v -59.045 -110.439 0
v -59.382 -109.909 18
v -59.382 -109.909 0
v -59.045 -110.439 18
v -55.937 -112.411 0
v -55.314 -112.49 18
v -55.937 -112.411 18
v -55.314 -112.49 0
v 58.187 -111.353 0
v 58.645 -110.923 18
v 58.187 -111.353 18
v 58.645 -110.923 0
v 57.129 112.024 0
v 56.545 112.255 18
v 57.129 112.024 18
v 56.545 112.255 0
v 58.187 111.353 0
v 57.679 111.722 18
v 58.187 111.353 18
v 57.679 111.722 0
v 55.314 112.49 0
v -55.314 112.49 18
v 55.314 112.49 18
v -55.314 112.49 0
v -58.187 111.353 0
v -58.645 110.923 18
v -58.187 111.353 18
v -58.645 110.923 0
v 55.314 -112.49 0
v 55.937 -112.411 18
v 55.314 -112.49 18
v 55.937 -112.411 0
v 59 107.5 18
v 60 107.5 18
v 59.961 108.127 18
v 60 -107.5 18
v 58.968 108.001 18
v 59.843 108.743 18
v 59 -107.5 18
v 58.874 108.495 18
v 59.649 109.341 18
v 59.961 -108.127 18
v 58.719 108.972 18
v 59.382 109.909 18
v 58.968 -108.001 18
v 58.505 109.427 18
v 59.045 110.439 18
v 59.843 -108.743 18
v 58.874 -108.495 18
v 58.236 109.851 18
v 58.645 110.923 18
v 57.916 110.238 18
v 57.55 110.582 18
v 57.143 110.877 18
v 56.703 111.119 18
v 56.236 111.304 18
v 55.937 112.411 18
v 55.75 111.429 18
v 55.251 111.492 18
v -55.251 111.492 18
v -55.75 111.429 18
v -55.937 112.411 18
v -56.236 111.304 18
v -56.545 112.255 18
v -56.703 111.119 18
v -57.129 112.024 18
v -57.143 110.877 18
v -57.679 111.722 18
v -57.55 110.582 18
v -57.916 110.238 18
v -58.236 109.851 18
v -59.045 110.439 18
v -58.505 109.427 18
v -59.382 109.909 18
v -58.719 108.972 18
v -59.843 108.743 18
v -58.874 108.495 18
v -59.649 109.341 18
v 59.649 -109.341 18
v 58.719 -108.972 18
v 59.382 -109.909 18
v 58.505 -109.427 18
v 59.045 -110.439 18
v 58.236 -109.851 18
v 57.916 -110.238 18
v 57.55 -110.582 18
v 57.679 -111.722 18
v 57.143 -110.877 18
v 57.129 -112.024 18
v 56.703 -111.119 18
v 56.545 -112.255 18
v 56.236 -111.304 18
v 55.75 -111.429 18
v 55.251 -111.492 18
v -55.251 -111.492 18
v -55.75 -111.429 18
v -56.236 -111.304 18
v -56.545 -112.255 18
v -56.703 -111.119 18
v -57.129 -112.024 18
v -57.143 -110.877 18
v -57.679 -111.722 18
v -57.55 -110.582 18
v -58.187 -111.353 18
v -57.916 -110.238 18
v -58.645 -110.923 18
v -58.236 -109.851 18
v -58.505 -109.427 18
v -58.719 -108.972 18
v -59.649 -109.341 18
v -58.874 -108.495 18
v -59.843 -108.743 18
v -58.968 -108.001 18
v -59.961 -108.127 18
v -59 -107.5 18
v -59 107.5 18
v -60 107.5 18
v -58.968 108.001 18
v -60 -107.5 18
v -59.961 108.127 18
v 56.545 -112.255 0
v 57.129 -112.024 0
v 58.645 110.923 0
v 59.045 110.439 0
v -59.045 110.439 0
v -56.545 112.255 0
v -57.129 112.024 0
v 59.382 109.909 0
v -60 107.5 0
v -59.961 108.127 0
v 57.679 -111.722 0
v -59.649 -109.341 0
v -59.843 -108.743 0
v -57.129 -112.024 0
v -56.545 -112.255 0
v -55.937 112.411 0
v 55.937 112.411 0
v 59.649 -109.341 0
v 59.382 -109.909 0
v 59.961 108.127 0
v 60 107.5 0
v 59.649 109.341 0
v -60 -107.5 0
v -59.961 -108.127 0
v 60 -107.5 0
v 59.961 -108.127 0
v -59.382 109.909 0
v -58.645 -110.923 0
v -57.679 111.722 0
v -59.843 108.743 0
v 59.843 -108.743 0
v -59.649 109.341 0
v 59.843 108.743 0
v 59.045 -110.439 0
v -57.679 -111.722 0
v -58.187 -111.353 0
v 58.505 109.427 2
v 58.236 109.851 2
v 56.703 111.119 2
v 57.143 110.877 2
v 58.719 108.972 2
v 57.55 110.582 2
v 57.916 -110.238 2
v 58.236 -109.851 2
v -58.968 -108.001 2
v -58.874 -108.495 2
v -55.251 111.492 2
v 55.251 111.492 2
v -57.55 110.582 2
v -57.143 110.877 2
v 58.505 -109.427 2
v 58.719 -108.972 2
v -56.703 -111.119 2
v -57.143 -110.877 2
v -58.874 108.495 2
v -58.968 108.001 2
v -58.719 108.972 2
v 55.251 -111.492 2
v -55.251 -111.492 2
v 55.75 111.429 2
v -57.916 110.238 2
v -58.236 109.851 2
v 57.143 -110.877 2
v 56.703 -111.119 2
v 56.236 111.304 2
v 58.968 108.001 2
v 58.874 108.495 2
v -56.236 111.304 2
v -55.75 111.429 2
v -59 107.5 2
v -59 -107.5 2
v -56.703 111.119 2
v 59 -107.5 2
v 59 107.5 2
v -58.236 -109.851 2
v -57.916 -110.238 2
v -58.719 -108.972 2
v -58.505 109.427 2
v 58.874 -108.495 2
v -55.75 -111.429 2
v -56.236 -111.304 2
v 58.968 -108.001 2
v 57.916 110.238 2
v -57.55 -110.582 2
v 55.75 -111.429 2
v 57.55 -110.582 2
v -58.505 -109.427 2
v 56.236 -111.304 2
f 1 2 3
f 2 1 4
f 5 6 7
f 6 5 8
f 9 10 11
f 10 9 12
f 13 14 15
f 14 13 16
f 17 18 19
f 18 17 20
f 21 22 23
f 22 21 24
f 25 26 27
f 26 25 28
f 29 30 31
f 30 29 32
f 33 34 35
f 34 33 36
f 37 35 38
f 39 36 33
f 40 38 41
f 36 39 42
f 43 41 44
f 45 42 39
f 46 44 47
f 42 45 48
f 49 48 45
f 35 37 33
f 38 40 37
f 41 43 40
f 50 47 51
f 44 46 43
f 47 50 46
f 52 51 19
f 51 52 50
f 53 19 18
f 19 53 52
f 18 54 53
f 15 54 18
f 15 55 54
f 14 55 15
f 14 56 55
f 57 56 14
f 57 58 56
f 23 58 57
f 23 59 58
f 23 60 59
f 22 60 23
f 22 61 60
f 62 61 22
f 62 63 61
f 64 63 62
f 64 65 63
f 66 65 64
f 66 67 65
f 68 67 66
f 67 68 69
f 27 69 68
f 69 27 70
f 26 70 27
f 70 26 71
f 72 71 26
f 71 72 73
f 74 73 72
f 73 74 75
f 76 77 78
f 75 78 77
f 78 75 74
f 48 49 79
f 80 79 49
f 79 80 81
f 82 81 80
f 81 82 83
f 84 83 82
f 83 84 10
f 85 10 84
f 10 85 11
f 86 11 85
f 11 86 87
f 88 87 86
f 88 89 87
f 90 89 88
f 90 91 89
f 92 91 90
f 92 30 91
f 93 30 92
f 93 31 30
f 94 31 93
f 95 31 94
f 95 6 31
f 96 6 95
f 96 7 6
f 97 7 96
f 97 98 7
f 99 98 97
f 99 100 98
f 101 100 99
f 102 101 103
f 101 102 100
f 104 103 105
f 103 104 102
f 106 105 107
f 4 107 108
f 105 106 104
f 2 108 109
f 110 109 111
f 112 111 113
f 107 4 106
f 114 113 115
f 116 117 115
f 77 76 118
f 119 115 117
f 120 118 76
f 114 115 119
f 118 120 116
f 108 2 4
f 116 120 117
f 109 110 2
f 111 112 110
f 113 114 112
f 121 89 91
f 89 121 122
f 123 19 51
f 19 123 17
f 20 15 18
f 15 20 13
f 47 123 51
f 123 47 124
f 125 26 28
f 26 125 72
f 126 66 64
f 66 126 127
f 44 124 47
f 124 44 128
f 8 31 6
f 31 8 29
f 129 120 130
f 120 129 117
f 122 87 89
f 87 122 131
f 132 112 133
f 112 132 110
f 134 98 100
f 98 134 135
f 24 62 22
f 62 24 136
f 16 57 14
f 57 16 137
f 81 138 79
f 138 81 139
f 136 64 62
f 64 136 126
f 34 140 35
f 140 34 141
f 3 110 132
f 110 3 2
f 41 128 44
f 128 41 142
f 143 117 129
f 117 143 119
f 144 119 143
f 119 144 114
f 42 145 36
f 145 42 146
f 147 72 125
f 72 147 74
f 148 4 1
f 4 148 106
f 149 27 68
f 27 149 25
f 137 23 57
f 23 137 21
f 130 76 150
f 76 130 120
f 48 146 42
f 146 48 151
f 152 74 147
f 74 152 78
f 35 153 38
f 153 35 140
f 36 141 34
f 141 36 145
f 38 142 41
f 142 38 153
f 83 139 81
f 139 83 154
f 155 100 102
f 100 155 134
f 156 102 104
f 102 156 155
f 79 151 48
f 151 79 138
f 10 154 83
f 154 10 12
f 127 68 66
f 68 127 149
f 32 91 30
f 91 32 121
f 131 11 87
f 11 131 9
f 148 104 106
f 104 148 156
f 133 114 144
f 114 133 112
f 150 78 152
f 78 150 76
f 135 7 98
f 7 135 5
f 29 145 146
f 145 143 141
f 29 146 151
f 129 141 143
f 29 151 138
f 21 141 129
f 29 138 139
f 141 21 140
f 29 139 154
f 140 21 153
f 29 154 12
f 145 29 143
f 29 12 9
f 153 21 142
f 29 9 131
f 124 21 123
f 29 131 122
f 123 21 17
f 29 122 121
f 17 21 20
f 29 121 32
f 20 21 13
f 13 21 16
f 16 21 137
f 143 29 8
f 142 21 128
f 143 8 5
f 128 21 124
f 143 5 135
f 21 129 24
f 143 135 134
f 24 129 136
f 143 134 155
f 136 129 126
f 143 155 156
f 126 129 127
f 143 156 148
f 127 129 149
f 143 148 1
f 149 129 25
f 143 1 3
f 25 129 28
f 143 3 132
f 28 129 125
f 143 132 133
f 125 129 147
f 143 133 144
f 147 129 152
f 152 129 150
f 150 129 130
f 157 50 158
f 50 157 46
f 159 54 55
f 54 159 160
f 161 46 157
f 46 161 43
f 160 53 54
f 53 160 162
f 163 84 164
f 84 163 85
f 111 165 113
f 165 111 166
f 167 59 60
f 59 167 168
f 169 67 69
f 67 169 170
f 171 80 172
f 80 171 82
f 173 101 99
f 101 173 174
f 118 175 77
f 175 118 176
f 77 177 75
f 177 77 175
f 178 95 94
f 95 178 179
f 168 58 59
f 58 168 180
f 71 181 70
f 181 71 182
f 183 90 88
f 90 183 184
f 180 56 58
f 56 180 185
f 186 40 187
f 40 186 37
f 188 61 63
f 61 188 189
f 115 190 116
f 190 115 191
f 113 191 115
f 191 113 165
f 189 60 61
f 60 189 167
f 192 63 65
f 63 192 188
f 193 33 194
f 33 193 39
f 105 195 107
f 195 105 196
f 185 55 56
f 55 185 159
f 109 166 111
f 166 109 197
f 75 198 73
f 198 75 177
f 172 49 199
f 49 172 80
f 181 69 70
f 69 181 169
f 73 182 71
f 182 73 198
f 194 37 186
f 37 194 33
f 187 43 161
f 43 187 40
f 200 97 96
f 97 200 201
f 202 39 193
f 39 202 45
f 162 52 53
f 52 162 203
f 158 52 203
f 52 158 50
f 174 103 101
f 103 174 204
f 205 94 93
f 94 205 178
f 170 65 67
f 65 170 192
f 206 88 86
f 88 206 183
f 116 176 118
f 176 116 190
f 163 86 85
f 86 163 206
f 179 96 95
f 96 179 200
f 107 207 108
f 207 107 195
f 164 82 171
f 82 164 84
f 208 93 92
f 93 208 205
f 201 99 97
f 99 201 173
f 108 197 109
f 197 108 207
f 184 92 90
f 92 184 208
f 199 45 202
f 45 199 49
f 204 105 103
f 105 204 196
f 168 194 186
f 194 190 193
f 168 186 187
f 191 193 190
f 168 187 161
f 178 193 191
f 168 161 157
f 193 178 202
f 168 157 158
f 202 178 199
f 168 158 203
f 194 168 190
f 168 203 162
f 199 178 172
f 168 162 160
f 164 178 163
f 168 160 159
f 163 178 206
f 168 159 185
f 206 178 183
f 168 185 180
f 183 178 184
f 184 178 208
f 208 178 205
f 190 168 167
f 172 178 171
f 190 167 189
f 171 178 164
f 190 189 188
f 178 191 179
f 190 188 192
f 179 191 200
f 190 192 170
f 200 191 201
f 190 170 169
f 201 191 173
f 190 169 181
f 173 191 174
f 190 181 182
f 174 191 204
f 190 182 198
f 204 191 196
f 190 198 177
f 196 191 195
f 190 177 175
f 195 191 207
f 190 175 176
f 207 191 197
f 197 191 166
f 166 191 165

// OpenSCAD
$fn = 50;


difference() {
	union() {
		hull() {
			translate(v = [-55.0000000000, 107.5000000000, 0]) {
				cylinder(h = 18, r = 5);
			}
			translate(v = [55.0000000000, 107.5000000000, 0]) {
				cylinder(h = 18, r = 5);
			}
			translate(v = [-55.0000000000, -107.5000000000, 0]) {
				cylinder(h = 18, r = 5);
			}
			translate(v = [55.0000000000, -107.5000000000, 0]) {
				cylinder(h = 18, r = 5);
			}
		}
	}
	union() {
		translate(v = [0, 0, 2]) {
			hull() {
				translate(v = [-55.0000000000, 107.5000000000, 0]) {
					cylinder(h = 16, r = 4);
				}
				translate(v = [55.0000000000, 107.5000000000, 0]) {
					cylinder(h = 16, r = 4);
				}
				translate(v = [-55.0000000000, -107.5000000000, 0]) {
					cylinder(h = 16, r = 4);
				}
				translate(v = [55.0000000000, -107.5000000000, 0]) {
					cylinder(h = 16, r = 4);
				}
			}
		}
	}
}
